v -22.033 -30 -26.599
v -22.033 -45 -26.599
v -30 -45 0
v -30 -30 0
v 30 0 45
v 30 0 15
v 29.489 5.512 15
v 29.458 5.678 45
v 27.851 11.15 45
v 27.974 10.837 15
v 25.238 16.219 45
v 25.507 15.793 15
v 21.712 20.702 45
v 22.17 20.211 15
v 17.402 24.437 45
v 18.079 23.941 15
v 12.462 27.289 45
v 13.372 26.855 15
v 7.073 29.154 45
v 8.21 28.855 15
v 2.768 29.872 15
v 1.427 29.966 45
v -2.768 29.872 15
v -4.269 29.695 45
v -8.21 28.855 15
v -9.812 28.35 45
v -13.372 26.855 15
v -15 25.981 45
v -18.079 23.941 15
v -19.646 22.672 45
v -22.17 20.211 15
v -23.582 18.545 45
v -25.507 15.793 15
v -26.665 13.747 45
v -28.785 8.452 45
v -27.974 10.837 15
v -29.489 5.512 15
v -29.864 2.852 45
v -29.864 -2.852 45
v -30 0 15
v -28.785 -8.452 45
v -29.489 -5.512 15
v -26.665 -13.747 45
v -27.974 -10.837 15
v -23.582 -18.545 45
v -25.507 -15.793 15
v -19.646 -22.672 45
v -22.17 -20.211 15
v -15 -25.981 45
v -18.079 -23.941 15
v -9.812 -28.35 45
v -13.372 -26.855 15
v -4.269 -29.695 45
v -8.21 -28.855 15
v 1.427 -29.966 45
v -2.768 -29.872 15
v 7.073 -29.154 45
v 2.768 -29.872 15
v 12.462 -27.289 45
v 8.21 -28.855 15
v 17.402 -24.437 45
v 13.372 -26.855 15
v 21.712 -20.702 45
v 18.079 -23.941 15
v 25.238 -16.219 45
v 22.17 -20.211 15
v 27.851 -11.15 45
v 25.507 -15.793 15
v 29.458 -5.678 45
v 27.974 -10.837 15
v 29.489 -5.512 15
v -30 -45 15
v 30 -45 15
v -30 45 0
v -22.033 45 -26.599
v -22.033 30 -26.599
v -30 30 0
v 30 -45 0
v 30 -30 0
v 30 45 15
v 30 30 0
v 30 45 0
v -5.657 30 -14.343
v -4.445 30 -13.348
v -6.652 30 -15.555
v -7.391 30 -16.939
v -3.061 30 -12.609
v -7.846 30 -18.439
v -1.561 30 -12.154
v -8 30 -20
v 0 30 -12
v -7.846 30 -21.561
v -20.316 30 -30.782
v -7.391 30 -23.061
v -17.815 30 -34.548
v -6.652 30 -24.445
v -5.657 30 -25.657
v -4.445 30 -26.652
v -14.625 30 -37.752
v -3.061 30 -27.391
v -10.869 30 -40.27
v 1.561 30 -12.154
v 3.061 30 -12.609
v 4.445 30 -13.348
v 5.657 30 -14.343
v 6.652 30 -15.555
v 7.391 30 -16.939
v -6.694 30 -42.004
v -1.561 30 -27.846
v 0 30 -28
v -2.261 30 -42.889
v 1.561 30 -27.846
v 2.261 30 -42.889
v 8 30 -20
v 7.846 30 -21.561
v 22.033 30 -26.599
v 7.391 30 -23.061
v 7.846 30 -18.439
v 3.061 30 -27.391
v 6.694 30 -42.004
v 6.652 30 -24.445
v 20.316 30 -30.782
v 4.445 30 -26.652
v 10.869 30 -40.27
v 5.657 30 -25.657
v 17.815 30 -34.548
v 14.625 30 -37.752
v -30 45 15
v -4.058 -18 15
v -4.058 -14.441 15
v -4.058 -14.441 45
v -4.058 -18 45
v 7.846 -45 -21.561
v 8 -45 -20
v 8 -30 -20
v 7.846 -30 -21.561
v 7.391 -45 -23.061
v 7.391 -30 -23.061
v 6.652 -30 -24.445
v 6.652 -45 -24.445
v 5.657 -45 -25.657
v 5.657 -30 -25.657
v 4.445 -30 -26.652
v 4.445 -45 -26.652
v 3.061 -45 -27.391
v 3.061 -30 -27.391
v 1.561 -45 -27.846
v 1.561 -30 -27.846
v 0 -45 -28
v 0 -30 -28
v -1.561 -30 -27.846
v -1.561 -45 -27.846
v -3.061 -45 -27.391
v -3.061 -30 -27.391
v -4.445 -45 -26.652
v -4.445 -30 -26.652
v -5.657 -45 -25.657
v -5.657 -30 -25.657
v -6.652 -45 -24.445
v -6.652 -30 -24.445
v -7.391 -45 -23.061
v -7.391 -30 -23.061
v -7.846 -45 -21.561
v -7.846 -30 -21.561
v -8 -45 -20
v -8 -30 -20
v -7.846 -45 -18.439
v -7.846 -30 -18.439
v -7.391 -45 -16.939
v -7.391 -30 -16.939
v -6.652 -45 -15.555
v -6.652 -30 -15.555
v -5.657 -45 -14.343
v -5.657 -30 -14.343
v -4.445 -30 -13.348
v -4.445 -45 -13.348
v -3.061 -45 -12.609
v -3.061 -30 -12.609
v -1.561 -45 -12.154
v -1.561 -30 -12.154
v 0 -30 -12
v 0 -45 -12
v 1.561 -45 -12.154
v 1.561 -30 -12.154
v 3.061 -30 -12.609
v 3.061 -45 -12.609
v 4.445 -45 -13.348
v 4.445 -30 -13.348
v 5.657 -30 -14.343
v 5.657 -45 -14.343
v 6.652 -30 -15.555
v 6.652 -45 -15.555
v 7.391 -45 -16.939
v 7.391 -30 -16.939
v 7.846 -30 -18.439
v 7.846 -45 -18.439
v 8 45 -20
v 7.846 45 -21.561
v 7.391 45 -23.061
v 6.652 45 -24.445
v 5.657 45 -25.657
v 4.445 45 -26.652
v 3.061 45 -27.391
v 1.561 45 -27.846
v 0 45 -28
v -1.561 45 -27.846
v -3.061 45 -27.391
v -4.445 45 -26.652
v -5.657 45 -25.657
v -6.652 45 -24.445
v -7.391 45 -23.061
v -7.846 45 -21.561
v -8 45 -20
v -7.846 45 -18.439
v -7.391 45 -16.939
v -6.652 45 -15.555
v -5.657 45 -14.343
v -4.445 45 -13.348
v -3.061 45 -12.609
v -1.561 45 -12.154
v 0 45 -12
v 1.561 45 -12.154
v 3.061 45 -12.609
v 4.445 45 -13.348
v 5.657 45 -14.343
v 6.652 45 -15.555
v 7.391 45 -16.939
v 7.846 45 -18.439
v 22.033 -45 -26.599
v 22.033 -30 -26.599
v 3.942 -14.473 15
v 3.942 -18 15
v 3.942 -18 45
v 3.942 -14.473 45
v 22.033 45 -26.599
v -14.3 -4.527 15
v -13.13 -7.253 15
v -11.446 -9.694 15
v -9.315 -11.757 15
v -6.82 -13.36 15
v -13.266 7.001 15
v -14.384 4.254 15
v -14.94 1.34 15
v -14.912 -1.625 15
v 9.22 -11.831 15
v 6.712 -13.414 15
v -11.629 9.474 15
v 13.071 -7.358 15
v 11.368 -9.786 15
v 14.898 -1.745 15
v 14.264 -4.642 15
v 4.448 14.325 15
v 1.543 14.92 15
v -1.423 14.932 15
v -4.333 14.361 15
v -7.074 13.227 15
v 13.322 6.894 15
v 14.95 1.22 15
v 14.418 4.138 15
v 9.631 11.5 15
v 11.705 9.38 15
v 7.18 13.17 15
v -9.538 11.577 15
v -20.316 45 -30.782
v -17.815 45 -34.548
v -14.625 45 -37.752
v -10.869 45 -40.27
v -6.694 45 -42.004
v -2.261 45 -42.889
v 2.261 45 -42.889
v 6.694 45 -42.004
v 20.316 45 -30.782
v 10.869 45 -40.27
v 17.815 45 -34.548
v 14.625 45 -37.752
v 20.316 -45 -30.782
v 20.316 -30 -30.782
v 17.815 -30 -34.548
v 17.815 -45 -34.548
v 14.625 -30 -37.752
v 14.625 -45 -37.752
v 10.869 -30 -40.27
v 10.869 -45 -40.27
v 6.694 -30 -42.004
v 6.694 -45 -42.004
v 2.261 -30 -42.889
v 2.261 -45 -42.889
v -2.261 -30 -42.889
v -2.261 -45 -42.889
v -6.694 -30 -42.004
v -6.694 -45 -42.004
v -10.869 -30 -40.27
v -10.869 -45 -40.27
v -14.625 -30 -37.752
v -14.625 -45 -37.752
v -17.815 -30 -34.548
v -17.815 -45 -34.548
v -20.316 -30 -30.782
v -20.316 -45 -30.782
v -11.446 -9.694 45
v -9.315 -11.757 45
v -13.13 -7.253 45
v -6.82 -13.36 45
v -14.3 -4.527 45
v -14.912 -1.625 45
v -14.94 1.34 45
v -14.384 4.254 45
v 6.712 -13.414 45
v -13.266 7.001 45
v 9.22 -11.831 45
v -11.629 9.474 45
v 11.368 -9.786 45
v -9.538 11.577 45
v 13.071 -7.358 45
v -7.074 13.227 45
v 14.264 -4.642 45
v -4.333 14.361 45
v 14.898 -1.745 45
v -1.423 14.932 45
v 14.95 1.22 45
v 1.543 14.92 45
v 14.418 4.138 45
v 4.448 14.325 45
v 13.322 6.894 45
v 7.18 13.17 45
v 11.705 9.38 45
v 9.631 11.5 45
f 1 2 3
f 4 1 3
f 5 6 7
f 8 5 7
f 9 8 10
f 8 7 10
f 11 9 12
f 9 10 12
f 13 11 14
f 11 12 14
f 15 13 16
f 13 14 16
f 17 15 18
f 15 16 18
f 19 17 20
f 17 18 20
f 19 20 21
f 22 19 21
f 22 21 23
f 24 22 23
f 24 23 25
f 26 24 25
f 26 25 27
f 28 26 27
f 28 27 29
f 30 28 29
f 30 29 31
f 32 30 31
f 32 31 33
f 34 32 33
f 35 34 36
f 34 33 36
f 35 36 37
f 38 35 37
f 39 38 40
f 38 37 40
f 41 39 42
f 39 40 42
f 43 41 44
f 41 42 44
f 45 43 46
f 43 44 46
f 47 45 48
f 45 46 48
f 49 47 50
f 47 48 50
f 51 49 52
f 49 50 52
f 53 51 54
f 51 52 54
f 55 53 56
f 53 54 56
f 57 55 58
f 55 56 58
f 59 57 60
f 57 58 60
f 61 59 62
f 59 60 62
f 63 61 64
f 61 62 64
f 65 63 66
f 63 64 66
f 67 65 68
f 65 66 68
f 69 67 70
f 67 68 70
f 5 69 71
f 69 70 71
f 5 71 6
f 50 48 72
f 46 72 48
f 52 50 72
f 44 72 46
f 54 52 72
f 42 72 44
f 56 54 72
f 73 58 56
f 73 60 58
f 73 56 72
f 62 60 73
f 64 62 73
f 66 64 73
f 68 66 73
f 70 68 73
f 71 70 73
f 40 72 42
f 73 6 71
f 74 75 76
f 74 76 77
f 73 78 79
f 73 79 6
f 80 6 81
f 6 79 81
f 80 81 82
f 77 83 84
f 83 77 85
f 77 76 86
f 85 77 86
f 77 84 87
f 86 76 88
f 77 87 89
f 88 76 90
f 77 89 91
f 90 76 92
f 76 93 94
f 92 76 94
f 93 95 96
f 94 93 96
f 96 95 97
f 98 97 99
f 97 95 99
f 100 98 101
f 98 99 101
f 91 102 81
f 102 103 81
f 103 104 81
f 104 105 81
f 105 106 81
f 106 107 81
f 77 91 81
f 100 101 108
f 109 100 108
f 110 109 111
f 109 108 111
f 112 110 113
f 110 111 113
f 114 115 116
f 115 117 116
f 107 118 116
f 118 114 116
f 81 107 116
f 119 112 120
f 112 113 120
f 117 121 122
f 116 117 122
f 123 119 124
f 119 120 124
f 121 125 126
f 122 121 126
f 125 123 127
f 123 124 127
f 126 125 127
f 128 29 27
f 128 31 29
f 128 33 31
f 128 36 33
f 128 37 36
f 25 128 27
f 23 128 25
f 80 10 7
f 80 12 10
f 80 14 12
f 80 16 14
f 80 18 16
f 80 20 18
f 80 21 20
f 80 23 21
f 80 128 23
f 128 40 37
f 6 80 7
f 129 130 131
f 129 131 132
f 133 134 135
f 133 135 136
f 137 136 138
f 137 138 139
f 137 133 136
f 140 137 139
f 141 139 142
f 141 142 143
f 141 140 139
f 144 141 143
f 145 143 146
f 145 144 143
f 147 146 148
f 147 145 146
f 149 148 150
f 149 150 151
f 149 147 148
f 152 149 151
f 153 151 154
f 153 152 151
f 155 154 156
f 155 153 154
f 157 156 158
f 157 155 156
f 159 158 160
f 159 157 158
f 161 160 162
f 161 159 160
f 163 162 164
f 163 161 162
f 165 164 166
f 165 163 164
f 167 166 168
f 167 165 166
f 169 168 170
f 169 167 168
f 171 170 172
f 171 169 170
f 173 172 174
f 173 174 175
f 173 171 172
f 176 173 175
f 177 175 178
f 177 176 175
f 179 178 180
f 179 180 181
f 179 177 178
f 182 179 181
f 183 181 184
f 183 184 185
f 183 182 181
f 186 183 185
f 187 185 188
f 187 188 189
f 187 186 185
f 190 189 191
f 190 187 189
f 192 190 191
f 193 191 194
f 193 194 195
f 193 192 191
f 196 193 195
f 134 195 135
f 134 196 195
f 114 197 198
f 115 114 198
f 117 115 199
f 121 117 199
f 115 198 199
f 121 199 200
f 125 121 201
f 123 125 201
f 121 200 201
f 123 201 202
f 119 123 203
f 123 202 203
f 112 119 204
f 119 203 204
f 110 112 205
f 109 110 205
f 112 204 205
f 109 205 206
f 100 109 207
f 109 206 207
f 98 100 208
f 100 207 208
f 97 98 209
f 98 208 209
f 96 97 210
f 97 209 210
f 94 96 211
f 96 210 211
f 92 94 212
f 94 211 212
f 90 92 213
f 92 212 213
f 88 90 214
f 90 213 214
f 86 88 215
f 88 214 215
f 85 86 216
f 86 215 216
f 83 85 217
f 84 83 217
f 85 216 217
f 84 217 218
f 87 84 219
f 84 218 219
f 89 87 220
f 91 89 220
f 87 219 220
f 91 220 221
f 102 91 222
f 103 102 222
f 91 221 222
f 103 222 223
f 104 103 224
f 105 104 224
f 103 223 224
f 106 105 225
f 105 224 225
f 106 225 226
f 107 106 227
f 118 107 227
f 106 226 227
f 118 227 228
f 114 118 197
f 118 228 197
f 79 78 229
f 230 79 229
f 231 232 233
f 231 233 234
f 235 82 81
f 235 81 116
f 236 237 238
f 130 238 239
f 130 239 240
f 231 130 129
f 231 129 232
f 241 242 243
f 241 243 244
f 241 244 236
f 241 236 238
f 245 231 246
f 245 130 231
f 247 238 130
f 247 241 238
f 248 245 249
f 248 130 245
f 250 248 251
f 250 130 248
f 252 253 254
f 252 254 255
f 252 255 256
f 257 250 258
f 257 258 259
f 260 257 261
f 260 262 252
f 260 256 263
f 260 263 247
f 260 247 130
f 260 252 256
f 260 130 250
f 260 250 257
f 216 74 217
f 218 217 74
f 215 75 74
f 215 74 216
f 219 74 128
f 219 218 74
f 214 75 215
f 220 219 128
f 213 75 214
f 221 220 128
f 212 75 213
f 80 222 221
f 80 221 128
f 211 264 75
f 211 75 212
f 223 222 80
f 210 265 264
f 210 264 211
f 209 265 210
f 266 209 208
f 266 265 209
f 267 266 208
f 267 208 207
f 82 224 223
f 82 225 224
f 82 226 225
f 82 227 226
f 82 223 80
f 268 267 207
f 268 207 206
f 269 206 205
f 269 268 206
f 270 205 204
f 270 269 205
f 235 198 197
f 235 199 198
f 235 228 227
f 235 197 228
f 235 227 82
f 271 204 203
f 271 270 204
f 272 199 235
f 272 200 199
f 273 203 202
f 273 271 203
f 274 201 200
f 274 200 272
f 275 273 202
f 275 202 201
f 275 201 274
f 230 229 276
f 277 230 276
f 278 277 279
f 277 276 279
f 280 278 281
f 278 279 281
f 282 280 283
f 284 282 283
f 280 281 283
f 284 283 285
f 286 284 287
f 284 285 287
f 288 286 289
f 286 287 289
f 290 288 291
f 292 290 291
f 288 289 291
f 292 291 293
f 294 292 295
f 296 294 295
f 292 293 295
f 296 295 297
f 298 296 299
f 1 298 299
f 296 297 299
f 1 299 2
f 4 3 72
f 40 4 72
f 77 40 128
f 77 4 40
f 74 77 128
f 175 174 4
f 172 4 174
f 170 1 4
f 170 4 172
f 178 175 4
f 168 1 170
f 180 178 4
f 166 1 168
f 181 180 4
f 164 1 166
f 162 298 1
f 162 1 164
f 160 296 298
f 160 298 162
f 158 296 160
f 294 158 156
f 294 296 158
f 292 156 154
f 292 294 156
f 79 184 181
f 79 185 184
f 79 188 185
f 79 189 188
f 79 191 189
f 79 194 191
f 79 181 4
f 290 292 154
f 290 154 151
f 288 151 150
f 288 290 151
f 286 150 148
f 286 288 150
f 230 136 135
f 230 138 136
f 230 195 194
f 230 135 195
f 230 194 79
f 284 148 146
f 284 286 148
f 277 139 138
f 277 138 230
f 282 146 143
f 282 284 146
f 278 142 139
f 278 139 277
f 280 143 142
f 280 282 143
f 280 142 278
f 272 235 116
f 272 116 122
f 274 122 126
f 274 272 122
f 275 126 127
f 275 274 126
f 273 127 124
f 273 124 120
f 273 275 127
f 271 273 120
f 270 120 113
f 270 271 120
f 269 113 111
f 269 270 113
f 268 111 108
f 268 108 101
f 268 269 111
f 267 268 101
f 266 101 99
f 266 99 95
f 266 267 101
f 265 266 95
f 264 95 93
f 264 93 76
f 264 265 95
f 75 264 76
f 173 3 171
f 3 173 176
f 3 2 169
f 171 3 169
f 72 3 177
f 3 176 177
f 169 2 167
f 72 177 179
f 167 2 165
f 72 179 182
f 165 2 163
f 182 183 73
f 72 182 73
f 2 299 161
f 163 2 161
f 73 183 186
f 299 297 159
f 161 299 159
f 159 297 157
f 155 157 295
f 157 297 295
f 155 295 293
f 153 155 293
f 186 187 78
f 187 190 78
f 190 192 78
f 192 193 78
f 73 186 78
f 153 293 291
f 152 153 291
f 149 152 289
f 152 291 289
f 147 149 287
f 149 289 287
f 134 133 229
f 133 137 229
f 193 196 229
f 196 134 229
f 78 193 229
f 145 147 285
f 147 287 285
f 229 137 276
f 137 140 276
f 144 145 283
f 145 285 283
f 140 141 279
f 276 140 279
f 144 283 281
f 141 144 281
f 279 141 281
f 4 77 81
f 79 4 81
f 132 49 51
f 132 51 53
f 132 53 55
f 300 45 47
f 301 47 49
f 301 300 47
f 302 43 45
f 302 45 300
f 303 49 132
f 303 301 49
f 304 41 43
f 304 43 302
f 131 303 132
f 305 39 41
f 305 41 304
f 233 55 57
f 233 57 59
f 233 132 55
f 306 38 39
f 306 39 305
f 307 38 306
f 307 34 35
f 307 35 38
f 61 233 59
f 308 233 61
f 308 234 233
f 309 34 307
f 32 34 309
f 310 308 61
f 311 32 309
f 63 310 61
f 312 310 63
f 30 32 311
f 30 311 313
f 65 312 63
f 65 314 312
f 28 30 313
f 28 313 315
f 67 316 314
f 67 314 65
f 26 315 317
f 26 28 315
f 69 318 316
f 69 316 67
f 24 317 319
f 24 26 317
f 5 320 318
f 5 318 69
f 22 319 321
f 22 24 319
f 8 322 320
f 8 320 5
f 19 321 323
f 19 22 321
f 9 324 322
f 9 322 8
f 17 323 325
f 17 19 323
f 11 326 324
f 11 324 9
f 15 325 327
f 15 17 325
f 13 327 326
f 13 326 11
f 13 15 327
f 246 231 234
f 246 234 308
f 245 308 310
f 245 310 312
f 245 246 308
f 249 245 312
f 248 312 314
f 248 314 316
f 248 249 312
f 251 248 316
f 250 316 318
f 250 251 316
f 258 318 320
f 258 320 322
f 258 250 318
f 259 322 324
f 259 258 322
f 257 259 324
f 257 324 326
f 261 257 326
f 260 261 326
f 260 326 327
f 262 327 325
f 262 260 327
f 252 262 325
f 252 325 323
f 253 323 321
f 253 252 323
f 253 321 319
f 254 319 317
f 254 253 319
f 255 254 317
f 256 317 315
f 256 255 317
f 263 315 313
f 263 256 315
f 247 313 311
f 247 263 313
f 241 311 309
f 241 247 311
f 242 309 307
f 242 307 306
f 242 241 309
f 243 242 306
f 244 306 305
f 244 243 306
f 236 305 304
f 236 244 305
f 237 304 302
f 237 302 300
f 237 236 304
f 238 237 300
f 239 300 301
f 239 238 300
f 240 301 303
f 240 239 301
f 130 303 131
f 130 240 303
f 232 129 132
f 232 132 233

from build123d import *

# Parameters (mm, degrees)
SKETCH1_W           = 60
SKETCH1_H           = 90
BOSS_EXTRUDE1_DEPTH = 15
SKETCH2_R           = 30
BOSS_EXTRUDE2_DEPTH = 30
SKETCH3_R           = 8
BOSS_EXTRUDE3_DEPTH = 15


with BuildPart() as part:
    # Sketch1 → Boss-Extrude1 (new body)
    with BuildSketch(Plane.XY):
        Rectangle(SKETCH1_W, SKETCH1_H)
    extrude(amount=BOSS_EXTRUDE1_DEPTH)

    # Sketch2 → Boss-Extrude2 (add)
    with BuildSketch(Plane.XY.offset(15)):
        Circle(SKETCH2_R)
        with BuildLine():
            Line((-4.058122732, -14.440624637), (-4.058122732, -17.999887391))
            Line((-4.058122732, -17.999887391), (3.941877268, -17.999887391))
            Line((3.941877268, -17.999887391), (3.941877268, -14.472788384))
            ThreePointArc((3.941877268, -14.472788384), (0.060306539, 14.99987877), (-4.058122732, -14.440624637))
        make_face(mode=Mode.SUBTRACT)
    extrude(amount=BOSS_EXTRUDE2_DEPTH)

    # Sketch3 → Boss-Extrude3 (add)
    with BuildSketch(Plane(origin=(0, 45, 0), x_dir=(1, 0, 0), z_dir=(0, 1, 0))):
        with BuildLine():
            Line((-30, 0), (30, 0))
            Line((30, 0), (22.03289839, 26.599347585))
            ThreePointArc((22.03289839, 26.599347585), (0, 43), (-22.03289839, 26.599347585))
            Line((-22.03289839, 26.599347585), (-30, 0))
        make_face()
        with Locations((0, 20)):
            Circle(SKETCH3_R, mode=Mode.SUBTRACT)
    boss_extrude3 = extrude(amount=-BOSS_EXTRUDE3_DEPTH)

    # Mirror1: Boss-Extrude3 across plane
    add(boss_extrude3.mirror(Plane.ZX))


solid = part.part
